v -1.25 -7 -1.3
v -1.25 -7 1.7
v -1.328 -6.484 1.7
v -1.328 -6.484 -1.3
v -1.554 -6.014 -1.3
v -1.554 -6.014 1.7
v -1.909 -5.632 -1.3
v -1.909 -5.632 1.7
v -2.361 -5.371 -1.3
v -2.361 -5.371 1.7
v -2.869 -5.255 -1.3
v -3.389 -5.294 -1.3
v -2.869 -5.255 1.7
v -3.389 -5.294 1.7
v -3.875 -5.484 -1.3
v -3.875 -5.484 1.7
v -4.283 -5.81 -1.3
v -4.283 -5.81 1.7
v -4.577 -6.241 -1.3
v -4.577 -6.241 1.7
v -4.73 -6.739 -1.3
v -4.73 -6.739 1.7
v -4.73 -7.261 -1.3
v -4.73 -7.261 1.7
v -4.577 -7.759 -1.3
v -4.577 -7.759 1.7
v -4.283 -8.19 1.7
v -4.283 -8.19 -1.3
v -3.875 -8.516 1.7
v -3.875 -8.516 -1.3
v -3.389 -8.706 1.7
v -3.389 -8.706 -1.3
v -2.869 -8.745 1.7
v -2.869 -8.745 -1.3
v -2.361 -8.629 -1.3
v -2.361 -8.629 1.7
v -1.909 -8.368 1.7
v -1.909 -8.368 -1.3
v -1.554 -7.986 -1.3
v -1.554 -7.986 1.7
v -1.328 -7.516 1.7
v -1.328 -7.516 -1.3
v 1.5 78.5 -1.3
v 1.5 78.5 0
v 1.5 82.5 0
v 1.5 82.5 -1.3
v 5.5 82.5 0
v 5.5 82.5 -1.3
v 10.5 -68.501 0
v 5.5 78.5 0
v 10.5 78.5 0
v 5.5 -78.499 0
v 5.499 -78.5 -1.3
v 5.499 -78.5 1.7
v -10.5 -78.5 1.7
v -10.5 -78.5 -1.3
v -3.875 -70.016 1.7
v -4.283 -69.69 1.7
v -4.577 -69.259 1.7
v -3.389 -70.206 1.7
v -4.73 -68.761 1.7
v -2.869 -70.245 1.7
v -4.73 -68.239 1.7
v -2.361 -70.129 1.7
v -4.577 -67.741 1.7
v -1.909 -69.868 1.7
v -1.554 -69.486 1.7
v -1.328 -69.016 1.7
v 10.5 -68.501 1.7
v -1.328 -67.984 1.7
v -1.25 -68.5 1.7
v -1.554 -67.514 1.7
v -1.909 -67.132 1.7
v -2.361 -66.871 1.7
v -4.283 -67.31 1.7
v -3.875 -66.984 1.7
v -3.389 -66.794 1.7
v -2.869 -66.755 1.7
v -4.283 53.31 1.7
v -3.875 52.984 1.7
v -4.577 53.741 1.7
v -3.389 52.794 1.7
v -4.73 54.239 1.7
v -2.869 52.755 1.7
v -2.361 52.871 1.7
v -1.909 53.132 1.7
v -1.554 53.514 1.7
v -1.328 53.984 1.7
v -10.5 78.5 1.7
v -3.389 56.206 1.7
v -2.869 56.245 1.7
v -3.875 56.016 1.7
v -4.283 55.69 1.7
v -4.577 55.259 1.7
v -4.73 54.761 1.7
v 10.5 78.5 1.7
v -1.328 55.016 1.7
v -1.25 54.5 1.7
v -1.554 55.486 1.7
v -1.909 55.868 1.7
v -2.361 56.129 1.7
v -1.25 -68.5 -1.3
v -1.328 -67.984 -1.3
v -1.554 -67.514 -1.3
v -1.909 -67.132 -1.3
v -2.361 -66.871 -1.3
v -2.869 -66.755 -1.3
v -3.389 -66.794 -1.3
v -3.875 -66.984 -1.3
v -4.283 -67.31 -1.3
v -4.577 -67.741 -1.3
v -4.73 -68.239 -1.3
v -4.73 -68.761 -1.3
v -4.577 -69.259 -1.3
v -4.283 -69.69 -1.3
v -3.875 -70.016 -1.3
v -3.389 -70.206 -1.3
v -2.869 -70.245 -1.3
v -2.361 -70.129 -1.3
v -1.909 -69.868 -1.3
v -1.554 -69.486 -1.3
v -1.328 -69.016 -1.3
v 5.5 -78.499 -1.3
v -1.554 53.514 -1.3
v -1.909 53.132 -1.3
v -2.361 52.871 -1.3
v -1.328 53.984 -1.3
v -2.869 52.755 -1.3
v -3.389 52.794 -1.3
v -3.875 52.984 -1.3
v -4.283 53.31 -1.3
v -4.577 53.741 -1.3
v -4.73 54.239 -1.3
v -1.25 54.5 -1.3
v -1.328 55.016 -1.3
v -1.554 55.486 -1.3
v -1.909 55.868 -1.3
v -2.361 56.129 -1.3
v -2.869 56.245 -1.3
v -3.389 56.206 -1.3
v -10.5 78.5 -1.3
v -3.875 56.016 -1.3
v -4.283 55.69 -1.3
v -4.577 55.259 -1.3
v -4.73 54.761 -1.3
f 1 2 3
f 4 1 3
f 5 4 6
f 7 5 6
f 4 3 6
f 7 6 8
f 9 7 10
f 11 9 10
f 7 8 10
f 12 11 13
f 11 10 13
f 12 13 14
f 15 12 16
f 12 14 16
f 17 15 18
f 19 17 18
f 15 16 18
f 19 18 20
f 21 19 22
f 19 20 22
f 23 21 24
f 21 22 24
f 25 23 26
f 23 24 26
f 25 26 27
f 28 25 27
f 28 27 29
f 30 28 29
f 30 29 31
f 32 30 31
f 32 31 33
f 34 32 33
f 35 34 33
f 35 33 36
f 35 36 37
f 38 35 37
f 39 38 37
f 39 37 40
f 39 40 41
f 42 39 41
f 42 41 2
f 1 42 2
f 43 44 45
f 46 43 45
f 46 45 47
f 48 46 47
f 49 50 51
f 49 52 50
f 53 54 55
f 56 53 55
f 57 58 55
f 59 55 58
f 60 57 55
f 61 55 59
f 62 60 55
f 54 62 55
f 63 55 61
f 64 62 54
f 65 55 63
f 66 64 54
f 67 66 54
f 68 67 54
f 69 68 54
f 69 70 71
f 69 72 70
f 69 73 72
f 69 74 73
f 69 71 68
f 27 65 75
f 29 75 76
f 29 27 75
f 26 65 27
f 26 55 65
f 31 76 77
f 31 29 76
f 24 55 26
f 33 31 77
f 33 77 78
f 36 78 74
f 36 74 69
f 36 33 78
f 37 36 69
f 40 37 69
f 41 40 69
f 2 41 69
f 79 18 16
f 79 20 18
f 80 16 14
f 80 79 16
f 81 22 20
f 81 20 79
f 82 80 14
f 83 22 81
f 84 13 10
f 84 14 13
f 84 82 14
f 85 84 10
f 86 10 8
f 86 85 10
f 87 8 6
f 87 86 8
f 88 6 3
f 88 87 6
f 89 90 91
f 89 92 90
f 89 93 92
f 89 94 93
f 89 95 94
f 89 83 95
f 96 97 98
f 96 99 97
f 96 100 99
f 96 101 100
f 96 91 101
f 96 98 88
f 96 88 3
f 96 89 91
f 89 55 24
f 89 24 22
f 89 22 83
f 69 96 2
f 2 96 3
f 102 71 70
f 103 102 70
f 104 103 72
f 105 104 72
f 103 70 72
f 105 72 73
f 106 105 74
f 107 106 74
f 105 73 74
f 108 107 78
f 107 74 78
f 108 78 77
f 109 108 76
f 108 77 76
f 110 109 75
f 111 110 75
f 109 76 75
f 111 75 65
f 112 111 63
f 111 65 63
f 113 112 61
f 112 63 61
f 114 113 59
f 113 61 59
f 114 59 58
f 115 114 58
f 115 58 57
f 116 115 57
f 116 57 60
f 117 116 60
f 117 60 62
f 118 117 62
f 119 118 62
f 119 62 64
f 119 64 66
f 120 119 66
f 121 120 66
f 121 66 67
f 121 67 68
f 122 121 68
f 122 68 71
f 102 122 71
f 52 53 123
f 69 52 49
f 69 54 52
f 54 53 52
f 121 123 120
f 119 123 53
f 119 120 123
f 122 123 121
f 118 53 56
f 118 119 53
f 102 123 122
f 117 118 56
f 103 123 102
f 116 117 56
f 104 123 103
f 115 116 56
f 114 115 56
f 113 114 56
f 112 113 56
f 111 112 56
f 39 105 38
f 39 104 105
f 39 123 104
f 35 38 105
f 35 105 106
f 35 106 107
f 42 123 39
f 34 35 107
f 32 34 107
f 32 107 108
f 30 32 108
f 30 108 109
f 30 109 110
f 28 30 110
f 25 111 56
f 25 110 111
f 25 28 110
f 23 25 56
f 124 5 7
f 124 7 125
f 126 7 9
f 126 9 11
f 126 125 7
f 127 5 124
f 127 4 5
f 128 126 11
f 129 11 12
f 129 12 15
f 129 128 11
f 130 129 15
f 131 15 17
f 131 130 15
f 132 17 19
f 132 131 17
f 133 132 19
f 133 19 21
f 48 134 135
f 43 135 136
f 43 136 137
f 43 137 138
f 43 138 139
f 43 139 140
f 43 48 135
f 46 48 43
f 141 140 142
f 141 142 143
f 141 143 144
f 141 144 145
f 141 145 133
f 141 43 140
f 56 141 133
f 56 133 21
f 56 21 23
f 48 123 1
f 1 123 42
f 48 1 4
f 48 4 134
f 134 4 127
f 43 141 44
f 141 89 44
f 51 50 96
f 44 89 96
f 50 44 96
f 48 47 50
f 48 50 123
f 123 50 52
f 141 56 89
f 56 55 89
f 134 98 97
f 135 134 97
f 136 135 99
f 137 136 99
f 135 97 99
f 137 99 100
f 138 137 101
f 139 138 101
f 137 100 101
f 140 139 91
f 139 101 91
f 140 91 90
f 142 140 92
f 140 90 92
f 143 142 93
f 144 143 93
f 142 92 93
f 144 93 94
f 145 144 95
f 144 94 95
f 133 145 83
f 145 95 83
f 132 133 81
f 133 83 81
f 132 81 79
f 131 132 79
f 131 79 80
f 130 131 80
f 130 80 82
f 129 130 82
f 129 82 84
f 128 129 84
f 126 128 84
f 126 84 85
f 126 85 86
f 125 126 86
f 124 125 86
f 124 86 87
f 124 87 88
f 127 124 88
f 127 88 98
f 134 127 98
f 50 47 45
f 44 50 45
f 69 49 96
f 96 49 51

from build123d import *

# Parameters (mm, degrees)
SKETCH1_W               = 21
SKETCH1_H               = 157
BOSS_EXTRUDE1_DEPTH     = 1.7
BOSS_EXTRUDE2_DEPTH     = 1.3
SKETCH3_R               = 1.75
CUT_EXTRUDE1_DEPTH      = 4
CUT_EXTRUDE2_DEPTH      = 1
CUT_EXTRUDE2_DEPTH_BACK = 4


with BuildPart() as part:
    # Sketch1 → Boss-Extrude1 (new body)
    with BuildSketch(Plane.XY):
        Rectangle(SKETCH1_W, SKETCH1_H)
    extrude(amount=BOSS_EXTRUDE1_DEPTH)

    # Sketch2 → Boss-Extrude2 (add)
    with BuildSketch(Plane(origin=(0, 0, 0), x_dir=(-1, 0, 0), z_dir=(0, 0, -1))):
        Polygon((-5.5, 78.5), (-5.5, -78.5), (10.5, -78.5), (10.5, 78.5), (-1.5, 78.5), (-1.5, 82.5), (-5.5, 82.5), align=None)
    extrude(amount=BOSS_EXTRUDE2_DEPTH)

    # Sketch3 → Cut-Extrude1 (cut, through all)
    with BuildSketch(Plane.XY.offset(1.7)):
        with Locations((-3, 54.5)):
            Circle(SKETCH3_R)
        with Locations((-3, -7)):
            Circle(SKETCH3_R)
        with Locations((-3, -68.5)):
            Circle(SKETCH3_R)
    extrude(amount=-CUT_EXTRUDE1_DEPTH, mode=Mode.SUBTRACT)

    # Sketch4 → Cut-Extrude2 (cut, two sides)
    with BuildSketch(Plane.XY.offset(1.7)) as cut_extrude2_sk:
        Polygon((5.499288315, -78.5), (10.5, -68.500735895), (10.5, -78.5), align=None)
    extrude(amount=CUT_EXTRUDE2_DEPTH, mode=Mode.SUBTRACT)
    extrude(cut_extrude2_sk.sketch, amount=-CUT_EXTRUDE2_DEPTH_BACK, mode=Mode.SUBTRACT)


solid = part.part
